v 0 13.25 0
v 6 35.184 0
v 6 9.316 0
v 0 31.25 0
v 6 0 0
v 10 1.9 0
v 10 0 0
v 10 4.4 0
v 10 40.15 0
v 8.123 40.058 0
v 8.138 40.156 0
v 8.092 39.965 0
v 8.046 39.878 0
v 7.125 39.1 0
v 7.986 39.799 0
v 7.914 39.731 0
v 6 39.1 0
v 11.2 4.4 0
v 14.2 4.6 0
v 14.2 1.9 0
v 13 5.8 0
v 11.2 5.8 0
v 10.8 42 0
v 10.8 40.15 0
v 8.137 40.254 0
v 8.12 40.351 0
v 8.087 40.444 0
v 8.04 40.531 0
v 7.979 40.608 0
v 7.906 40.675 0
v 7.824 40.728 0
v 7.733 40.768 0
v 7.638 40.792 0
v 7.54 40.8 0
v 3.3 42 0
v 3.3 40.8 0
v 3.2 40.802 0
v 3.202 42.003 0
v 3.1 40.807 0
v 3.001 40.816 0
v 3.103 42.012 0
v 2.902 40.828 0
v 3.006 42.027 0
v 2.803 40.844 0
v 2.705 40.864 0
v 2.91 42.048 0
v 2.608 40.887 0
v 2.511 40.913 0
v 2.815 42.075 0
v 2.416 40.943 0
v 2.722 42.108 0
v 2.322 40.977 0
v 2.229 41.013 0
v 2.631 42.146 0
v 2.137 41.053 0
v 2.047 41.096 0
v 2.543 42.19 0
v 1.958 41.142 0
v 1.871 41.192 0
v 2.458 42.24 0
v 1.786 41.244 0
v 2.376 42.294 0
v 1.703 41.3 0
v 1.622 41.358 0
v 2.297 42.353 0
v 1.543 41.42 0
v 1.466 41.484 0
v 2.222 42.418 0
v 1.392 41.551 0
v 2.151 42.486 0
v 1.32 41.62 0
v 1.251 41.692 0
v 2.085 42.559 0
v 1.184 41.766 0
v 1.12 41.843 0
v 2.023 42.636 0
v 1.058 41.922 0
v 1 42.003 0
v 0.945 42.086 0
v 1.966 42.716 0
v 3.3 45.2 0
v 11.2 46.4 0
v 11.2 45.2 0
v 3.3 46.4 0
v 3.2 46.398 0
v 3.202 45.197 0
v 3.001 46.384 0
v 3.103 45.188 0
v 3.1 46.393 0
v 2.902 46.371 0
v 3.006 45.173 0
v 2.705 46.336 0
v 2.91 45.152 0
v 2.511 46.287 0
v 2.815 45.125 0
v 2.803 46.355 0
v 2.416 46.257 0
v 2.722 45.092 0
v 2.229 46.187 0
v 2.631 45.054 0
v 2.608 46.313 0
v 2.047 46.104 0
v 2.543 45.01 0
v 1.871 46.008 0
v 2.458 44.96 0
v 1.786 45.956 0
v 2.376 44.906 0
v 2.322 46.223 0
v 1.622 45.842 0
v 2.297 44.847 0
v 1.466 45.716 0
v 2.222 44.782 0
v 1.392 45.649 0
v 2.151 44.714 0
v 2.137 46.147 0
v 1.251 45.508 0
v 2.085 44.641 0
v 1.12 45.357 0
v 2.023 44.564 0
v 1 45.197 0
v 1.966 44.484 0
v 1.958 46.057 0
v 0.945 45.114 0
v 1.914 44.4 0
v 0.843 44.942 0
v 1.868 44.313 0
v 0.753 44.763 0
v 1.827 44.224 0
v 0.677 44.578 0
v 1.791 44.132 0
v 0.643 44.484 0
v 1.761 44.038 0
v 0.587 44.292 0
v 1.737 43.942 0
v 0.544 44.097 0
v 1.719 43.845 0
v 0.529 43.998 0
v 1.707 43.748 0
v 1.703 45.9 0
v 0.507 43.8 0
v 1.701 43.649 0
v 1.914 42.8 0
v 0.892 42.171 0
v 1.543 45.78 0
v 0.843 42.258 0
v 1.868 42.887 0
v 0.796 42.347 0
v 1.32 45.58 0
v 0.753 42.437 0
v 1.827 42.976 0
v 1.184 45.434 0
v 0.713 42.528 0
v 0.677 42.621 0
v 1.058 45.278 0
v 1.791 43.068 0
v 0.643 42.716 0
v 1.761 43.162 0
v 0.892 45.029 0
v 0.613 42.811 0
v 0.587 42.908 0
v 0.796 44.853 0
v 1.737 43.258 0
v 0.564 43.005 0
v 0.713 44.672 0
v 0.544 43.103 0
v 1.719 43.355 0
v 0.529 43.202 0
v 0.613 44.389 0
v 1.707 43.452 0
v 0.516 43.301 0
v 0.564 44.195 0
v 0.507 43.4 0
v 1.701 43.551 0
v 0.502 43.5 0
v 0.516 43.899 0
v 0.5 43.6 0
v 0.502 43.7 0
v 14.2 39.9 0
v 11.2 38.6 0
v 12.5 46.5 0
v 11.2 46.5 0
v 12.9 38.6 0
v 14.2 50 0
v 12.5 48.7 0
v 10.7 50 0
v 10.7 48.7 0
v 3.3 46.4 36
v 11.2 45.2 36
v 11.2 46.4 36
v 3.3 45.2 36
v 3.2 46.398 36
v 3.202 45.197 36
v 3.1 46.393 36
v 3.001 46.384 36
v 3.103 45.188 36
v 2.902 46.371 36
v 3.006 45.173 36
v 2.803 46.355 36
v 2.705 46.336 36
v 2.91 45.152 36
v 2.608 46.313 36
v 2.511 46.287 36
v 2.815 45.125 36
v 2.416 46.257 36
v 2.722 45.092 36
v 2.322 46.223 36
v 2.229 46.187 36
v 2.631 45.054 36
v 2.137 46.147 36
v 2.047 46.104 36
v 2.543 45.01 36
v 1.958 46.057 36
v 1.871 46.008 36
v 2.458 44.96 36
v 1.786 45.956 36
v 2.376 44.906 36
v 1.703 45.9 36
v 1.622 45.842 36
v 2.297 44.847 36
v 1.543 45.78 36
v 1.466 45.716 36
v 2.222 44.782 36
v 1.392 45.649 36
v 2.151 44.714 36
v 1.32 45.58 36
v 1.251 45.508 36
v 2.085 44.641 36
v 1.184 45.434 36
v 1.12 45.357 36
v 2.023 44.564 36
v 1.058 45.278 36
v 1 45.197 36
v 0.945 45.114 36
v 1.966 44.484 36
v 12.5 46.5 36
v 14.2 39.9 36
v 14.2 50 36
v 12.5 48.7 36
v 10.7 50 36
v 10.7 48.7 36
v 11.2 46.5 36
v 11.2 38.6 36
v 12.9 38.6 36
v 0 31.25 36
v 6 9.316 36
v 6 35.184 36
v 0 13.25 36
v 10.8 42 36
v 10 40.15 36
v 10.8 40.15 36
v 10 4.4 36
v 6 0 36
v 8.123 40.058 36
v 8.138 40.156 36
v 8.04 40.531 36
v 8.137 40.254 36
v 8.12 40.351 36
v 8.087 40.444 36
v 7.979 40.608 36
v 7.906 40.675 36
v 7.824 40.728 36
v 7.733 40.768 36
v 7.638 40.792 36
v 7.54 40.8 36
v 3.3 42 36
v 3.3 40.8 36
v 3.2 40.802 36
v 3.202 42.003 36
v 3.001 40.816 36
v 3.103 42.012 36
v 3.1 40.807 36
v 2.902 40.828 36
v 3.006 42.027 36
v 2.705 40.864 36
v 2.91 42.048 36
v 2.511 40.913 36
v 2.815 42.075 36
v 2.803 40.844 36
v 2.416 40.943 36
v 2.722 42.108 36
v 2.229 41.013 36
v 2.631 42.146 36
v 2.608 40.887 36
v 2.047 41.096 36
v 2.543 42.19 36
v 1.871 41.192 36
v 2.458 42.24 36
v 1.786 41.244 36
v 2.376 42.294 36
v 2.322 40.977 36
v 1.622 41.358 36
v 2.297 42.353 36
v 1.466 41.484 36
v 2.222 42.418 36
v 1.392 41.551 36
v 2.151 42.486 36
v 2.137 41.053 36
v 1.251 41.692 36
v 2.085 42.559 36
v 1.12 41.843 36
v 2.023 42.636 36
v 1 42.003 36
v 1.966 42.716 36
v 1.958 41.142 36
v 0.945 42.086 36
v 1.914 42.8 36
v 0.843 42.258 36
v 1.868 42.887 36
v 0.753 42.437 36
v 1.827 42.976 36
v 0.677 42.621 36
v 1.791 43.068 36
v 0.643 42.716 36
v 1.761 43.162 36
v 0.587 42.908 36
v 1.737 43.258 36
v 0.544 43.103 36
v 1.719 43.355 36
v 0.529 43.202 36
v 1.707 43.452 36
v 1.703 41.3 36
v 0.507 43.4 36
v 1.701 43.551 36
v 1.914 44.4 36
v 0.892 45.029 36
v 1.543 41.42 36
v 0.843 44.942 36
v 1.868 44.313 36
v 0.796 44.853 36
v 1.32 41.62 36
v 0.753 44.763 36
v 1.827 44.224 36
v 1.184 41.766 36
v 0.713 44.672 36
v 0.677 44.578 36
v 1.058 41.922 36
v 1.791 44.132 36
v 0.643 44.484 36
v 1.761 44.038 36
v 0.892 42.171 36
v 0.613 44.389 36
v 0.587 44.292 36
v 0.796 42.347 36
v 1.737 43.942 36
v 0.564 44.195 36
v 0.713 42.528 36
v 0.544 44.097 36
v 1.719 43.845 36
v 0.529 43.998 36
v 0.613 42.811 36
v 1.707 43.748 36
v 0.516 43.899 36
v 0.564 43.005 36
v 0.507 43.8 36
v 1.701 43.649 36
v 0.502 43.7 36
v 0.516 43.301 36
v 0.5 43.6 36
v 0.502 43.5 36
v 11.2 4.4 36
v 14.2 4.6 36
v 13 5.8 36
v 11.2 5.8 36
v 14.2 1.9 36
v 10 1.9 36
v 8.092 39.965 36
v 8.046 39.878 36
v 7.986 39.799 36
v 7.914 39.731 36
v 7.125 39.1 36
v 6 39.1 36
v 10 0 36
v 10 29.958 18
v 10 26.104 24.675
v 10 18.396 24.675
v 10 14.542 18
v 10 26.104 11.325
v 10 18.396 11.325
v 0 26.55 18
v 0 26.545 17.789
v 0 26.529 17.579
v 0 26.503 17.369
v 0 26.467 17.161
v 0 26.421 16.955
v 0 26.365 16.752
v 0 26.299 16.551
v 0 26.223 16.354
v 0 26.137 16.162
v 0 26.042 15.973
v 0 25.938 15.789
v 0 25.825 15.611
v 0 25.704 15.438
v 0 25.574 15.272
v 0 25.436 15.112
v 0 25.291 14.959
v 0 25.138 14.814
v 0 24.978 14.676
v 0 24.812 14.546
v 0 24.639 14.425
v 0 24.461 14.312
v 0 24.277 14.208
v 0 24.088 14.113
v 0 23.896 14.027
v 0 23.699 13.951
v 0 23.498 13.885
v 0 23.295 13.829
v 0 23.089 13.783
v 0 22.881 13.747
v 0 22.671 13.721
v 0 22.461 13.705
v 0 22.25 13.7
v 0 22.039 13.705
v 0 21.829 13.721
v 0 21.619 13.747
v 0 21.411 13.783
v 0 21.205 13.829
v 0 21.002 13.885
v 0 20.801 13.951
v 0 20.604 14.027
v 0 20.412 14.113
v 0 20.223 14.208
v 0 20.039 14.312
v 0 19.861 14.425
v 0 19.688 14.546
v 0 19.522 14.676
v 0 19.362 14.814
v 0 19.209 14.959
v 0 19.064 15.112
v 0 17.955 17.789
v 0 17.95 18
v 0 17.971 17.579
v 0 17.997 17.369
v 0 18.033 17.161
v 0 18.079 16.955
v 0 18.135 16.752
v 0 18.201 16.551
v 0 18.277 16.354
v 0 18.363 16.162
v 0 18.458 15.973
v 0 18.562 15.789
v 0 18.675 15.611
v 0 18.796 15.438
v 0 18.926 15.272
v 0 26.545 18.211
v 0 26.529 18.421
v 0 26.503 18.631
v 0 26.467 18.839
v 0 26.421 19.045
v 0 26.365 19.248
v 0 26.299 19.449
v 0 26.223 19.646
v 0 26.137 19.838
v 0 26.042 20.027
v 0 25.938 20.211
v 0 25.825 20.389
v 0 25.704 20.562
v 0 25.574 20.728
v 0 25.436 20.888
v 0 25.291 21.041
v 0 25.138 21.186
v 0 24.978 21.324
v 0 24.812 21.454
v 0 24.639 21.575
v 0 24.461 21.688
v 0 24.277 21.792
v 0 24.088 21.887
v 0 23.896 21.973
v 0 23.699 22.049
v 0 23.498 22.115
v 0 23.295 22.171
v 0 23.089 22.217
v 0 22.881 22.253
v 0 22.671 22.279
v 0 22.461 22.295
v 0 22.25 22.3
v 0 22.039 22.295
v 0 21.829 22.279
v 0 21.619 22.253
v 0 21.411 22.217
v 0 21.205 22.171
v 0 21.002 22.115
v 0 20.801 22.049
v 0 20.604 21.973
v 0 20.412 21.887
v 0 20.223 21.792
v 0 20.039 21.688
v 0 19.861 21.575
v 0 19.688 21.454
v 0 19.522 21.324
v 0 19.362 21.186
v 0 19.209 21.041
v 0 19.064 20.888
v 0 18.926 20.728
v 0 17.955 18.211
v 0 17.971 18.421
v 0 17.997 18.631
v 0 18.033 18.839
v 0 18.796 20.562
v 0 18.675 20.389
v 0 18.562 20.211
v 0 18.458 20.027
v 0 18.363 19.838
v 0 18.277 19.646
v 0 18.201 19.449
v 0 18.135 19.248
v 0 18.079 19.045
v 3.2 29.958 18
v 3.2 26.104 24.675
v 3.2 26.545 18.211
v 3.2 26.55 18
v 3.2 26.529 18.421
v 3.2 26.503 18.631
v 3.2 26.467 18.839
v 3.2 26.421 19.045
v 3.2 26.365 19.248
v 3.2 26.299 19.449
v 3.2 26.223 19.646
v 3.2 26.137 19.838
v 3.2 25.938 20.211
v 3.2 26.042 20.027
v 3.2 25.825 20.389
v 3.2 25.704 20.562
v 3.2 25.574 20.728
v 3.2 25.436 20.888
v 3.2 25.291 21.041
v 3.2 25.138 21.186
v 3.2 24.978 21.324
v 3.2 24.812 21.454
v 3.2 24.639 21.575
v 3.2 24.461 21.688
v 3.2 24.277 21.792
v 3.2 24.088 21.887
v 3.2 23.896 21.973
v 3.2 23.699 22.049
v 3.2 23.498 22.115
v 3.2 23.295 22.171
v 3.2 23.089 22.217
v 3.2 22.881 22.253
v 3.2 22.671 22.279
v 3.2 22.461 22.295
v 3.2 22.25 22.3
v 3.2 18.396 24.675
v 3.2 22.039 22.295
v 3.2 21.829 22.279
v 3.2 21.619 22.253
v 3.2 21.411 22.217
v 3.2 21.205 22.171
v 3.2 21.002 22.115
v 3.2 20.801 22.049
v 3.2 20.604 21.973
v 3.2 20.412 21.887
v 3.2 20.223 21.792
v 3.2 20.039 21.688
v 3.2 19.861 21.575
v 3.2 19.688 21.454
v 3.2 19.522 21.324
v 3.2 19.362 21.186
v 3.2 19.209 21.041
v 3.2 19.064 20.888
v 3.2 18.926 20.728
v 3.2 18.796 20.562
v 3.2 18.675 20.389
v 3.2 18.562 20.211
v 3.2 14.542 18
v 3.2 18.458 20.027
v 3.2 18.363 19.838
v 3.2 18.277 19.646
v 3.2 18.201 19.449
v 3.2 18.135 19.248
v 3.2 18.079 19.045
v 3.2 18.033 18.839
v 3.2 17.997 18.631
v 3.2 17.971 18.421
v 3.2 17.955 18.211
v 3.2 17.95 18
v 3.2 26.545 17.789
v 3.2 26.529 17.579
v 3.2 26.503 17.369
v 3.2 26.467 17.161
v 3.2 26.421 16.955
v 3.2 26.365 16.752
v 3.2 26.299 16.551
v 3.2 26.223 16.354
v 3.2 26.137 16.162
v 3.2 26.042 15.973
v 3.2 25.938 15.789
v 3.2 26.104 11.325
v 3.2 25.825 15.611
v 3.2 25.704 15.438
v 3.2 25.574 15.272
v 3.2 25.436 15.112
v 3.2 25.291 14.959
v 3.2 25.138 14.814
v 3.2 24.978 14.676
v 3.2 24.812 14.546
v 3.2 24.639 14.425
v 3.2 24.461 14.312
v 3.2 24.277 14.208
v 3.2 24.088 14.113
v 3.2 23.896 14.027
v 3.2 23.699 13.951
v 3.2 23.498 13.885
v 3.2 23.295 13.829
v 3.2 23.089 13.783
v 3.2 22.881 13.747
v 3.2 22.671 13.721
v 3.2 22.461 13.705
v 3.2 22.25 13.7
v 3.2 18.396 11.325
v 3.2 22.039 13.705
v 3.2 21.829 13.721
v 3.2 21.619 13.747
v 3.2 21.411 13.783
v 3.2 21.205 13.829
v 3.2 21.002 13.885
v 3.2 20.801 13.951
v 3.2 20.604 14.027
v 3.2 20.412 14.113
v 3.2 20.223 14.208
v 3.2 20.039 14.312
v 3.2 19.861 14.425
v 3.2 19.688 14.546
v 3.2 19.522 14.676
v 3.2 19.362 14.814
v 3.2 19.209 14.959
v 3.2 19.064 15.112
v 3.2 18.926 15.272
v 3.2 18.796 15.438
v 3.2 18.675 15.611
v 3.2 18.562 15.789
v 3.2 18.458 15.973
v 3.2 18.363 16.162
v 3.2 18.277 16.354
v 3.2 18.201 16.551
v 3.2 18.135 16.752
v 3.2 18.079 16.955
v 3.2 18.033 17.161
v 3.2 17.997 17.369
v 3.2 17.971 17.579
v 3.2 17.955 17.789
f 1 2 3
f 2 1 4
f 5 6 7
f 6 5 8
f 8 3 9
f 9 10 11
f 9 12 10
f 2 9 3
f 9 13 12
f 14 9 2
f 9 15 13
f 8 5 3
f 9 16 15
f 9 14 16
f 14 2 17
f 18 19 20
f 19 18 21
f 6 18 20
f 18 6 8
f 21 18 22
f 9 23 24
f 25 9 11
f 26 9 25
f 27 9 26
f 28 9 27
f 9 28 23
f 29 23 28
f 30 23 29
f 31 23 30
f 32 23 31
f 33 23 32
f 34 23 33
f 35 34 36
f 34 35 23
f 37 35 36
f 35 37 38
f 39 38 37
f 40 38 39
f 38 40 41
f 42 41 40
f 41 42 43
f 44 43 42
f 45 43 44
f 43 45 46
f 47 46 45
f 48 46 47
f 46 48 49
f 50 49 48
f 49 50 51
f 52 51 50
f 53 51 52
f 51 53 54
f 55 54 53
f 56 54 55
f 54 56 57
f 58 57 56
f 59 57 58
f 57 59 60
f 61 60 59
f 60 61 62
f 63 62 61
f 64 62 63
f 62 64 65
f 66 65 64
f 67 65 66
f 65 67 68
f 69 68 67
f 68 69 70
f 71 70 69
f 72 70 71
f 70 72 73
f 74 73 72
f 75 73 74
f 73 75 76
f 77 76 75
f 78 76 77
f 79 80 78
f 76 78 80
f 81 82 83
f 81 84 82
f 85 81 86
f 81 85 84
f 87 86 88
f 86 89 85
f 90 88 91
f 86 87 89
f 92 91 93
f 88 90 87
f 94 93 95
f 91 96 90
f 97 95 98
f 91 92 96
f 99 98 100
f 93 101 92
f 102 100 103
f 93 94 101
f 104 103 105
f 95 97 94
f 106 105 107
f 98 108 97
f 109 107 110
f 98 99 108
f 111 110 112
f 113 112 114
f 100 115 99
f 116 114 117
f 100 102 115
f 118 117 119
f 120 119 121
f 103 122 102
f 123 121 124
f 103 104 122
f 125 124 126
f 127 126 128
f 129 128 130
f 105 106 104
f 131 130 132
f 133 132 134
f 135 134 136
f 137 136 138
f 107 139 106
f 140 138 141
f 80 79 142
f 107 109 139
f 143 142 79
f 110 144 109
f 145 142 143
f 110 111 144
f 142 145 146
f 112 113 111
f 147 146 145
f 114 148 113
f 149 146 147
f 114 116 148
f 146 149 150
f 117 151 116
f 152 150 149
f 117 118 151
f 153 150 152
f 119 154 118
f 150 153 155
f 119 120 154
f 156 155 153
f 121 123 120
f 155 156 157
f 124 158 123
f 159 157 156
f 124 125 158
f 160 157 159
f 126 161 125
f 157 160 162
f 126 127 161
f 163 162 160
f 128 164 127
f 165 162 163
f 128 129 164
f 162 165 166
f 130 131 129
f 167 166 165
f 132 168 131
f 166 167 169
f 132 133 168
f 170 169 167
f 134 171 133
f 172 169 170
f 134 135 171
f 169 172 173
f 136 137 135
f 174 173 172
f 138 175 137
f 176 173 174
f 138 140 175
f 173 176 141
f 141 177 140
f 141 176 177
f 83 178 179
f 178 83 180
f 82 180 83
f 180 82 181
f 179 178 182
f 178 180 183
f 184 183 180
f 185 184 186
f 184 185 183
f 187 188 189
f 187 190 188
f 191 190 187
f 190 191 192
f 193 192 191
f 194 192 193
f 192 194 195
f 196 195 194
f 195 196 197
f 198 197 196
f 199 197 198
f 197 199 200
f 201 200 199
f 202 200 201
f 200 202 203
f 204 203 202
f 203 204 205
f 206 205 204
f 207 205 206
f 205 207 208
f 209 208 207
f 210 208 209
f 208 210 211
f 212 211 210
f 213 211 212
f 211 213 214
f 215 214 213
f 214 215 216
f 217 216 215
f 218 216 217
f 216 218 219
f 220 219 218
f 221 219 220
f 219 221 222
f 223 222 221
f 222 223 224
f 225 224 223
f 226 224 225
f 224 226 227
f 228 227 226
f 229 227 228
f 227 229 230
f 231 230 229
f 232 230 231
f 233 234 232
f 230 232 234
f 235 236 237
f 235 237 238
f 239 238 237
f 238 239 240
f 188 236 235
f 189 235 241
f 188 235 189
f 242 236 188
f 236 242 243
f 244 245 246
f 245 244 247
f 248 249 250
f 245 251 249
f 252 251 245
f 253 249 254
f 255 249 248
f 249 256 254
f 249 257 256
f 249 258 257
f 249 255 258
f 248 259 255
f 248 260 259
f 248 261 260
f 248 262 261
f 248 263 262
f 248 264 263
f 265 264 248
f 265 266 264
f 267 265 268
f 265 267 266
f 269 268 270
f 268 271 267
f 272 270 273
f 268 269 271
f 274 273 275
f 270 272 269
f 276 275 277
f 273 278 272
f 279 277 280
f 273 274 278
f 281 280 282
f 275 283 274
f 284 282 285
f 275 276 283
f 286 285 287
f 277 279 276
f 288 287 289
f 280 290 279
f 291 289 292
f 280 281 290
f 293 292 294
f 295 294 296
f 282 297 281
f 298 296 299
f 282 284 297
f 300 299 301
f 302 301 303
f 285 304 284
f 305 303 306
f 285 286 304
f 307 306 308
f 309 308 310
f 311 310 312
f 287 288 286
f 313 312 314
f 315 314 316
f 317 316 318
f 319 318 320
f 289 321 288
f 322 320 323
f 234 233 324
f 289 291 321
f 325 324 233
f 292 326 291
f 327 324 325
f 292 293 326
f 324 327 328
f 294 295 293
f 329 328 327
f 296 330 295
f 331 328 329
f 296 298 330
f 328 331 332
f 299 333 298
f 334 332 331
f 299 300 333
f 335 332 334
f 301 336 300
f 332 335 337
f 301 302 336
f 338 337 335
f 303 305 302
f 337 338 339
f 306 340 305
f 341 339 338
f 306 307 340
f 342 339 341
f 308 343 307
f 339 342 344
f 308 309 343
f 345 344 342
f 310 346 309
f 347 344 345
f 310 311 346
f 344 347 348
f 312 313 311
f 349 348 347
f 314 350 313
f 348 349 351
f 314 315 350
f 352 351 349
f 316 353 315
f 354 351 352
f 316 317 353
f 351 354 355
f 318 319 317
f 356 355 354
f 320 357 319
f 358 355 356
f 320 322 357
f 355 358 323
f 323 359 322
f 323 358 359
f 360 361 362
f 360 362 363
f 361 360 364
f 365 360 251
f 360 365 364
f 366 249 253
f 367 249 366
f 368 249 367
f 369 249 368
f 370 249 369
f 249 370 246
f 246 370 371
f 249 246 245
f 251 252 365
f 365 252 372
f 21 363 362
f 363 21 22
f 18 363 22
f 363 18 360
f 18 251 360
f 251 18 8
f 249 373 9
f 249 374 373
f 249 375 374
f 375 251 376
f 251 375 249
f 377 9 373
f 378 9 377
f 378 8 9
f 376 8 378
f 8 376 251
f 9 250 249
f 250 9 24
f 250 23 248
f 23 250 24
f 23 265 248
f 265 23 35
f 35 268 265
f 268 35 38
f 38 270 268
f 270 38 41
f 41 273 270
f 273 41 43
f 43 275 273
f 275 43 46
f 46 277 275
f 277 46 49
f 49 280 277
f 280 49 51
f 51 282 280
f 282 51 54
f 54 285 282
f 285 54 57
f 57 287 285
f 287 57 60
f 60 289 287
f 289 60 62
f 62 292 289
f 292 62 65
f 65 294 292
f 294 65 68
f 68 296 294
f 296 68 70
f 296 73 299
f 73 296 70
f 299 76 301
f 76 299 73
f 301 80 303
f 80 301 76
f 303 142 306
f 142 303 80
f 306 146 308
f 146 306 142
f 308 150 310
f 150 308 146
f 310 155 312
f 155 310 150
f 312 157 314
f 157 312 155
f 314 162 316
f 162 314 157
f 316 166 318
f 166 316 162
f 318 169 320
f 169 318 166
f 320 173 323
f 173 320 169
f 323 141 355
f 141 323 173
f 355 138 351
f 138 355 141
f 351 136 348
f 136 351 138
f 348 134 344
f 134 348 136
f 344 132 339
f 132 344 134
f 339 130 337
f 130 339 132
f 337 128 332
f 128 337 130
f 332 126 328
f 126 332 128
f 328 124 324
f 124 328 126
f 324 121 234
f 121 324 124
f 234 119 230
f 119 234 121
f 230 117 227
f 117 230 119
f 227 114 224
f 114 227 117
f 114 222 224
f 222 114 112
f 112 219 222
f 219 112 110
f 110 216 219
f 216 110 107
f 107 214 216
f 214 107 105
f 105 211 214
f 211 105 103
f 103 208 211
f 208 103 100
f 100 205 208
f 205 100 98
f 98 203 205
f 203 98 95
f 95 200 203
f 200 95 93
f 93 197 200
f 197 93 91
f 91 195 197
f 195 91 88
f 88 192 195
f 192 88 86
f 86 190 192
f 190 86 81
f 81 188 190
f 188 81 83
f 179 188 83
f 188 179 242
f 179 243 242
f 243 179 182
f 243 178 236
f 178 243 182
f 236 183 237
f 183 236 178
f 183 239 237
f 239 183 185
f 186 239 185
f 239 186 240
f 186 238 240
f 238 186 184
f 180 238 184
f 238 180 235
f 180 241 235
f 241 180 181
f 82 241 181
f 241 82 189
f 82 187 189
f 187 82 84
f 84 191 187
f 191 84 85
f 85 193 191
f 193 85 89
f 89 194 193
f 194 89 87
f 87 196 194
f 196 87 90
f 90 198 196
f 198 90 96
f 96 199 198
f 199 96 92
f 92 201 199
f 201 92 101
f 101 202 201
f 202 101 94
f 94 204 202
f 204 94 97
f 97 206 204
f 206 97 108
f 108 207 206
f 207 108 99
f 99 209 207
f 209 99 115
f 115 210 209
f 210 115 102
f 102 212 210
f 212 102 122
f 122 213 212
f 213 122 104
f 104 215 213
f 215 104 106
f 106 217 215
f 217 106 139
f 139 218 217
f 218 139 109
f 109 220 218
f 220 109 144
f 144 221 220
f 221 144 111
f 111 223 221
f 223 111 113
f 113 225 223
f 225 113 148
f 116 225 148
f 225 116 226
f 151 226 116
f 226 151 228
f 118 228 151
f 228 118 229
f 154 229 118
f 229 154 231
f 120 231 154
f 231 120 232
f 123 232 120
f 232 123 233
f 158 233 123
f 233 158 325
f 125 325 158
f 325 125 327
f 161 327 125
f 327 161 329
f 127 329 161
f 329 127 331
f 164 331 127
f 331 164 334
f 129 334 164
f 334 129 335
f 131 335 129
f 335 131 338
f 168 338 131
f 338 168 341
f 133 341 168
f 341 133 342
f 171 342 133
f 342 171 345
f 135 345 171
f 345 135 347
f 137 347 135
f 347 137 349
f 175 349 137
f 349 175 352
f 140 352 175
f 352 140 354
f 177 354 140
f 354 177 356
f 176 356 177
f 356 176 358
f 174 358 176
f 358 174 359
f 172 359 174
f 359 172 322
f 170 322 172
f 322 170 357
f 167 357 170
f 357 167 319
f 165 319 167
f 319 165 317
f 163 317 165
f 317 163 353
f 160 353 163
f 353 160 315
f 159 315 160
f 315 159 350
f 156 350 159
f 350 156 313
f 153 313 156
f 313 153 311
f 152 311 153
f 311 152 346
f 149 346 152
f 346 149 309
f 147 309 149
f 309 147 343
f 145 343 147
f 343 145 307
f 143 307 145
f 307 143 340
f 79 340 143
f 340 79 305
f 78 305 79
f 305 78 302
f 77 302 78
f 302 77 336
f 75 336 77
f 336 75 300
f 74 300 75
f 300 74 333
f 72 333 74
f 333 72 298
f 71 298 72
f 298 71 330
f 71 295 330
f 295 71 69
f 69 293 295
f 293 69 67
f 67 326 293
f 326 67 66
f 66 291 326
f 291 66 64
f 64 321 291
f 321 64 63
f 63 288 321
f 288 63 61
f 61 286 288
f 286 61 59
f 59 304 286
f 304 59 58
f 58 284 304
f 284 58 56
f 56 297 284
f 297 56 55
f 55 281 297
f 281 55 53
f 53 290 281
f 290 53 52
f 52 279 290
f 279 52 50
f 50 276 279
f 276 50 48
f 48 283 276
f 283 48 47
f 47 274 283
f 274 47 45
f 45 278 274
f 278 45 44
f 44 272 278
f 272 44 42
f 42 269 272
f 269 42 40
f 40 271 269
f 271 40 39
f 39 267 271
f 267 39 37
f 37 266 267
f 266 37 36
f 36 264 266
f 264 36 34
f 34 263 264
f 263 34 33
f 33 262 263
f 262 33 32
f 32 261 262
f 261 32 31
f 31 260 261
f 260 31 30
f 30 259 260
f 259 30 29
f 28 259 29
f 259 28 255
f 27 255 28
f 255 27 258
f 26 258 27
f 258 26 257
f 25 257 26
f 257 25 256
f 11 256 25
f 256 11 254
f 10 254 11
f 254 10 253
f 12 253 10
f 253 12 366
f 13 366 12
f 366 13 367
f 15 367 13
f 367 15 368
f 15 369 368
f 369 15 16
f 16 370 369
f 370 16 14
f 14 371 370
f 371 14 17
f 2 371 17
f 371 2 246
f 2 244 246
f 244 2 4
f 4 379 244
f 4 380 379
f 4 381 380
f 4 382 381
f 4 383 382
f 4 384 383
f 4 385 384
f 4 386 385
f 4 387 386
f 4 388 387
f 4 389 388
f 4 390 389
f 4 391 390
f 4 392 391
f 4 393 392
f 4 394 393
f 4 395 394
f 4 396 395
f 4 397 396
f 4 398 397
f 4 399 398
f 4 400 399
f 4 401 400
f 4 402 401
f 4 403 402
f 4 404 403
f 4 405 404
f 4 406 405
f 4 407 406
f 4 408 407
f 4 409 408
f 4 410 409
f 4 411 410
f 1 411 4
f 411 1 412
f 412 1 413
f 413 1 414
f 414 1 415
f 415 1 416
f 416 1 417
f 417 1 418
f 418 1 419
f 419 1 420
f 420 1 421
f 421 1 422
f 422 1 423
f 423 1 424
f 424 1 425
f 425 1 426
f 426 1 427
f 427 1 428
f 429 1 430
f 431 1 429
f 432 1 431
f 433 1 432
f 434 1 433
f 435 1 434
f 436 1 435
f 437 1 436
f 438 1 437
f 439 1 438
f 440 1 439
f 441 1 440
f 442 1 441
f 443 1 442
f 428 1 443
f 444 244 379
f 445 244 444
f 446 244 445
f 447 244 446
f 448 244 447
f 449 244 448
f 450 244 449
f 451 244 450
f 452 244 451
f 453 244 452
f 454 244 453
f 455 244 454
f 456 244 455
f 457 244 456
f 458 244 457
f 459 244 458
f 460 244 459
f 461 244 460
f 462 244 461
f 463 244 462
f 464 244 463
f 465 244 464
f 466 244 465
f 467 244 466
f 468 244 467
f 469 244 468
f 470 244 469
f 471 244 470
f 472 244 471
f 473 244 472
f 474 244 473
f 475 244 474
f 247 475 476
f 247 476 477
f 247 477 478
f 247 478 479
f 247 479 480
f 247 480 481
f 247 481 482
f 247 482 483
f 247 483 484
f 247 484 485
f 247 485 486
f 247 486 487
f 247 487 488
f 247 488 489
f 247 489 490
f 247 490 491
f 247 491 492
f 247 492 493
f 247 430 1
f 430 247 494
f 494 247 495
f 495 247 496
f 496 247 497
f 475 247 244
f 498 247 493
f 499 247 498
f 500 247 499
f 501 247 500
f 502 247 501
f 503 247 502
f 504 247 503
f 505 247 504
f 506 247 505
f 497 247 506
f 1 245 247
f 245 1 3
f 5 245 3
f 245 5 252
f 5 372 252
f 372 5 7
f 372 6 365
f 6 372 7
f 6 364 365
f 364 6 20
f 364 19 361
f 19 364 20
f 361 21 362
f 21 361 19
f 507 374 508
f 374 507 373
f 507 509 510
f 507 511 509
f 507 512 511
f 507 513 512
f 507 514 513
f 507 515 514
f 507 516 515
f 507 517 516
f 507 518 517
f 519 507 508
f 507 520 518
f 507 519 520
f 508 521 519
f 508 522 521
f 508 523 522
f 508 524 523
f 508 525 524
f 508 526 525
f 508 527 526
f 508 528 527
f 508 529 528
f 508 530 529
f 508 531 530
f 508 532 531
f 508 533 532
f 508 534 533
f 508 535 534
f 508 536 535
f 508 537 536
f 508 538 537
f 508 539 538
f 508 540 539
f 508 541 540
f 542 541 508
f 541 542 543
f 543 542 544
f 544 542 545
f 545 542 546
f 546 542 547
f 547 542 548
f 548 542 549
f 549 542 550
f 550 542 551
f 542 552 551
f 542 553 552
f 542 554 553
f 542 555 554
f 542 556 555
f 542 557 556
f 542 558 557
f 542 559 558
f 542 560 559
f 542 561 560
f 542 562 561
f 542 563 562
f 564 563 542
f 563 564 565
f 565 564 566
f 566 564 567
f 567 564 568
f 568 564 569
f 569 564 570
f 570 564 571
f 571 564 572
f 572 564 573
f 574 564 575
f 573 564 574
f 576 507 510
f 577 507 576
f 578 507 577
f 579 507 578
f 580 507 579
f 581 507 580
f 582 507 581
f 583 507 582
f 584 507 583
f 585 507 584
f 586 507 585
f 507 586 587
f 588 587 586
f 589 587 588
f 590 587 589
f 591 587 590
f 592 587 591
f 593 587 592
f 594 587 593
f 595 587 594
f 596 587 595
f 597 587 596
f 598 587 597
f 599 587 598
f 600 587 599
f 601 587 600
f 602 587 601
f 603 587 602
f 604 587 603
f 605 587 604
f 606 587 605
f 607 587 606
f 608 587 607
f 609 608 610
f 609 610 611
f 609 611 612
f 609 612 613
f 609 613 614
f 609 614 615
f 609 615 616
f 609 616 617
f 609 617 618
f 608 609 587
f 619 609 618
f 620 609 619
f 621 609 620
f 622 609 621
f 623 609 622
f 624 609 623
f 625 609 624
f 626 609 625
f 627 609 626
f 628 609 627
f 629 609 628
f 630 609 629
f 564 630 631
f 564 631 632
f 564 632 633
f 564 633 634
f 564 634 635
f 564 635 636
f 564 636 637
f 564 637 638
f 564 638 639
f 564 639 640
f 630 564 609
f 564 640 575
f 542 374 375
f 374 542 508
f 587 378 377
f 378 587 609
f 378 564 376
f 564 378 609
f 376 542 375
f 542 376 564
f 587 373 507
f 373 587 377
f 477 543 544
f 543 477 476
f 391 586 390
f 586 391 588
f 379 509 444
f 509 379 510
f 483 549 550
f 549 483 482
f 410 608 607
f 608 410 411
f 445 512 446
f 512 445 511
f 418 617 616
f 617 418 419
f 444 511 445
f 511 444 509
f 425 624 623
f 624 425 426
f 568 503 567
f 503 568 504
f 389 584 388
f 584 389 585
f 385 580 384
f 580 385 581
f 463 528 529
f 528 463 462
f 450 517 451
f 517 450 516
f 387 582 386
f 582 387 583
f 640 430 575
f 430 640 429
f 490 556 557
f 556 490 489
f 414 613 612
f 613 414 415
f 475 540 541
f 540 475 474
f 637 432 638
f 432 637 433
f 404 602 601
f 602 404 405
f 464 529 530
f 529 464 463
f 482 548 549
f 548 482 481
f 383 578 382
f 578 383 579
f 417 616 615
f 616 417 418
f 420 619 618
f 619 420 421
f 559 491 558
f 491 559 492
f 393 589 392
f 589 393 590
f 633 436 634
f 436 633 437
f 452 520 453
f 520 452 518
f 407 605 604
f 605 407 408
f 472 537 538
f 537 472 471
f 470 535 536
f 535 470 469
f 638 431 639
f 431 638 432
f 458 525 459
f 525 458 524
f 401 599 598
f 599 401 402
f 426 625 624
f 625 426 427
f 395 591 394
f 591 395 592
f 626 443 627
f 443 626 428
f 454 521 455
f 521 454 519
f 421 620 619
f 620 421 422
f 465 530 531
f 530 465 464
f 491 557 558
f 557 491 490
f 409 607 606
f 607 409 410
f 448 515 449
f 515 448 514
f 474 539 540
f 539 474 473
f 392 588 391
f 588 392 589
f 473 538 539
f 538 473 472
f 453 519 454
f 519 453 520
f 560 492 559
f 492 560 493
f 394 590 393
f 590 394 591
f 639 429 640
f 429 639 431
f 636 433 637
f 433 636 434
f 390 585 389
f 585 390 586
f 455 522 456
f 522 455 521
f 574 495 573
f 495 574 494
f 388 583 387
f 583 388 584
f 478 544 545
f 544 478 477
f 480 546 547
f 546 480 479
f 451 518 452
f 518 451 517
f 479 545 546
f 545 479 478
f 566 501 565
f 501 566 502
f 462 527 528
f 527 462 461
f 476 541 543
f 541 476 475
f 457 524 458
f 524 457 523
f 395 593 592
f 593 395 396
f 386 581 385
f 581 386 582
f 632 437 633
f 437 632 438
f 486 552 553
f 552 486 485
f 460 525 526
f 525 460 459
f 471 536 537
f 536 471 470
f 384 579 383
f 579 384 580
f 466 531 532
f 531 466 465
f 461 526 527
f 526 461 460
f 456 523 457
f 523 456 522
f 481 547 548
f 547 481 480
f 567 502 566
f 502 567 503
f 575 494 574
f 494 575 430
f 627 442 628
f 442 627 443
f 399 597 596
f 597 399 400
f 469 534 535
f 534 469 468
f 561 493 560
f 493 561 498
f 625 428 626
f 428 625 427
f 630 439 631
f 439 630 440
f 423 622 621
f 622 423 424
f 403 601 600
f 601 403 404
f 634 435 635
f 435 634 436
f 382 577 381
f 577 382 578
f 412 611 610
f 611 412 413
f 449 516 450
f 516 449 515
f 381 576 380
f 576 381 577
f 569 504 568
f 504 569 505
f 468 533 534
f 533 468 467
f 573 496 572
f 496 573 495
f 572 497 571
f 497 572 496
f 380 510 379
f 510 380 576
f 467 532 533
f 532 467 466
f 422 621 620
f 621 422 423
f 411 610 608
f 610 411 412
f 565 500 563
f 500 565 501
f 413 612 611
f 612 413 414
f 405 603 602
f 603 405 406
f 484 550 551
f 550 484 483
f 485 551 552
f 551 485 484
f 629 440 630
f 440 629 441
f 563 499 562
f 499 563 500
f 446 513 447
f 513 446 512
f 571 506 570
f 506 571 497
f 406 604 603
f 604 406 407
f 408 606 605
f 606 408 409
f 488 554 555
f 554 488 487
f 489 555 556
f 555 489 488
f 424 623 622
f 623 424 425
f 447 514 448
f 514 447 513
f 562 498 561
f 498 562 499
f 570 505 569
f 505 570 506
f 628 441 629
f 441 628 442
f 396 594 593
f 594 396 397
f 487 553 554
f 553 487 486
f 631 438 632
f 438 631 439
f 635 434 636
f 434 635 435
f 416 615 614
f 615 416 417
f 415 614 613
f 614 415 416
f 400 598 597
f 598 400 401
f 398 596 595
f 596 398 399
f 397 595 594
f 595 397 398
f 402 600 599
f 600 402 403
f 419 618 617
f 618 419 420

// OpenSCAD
// DIN rail distribution stud holder — parametric model.
// Common-potential cable-lug connection point, e.g. for Victron Energy systems.
// The printed body mounts a metal distribution stud to a 35 mm DIN rail.
// Open in OpenSCAD, adjust the four Customizer inputs, press F6, Export > STL.
// Defaults: M8, 36 mm holder width, 35.75 mm stop spacing, 1 mm rail sheet.
// Each sheet groove includes 0.20 mm clearance. Support-to-latch gap: 0.40 mm.
// All exports are oriented for printing on their side, in millimetres.
// Wider or narrower holders change spring stiffness: check fit with a print.
// Clip mechanism inspiration (CC BY 4.0):
// Catatat / PlasticXYZ: https://www.printables.com/model/1753870-din-rail-clip-side-mount
// kc2zgu / marauder156: https://www.printables.com/model/556742-adjustable-din-rail-clip-freecad
// Bolt dimensions: https://uk.misumi-ec.com/pdf/ds/AAU1/AAU1_DIN_933_Stahl_8_8_data_sheet_en1.pdf

/* [Holder dimensions] */
// Bolt size and hex-head width across flats.
bolt = "M8"; // [M6:M6 - 10 mm head, M8:M8 - 13 mm head, M10_16:M10 - 16 mm head ISO, M10_17:M10 - 17 mm head DIN]
// M6/M8: 1 or 2 modules. M10: 1.5 or 2 modules. One module = 18 mm.
modules = 2; // [1:1 module - 18 mm, 1.5:1.5 modules - 27 mm, 2:2 modules - 36 mm]
// Added to the 35.75 mm default stop spacing. Split equally between both ends.
rail_allowance = 0; // [-0.5:0.05:0.5]
// Actual DIN rail sheet thickness. Groove clearance of 0.20 mm is added automatically.
sheet_thickness = 1; // [0.8:0.05:2]

/* [Hidden] */
$fn=128;
is_m10 = bolt=="M10_16" || bolt=="M10_17";
width = modules*18;
diameter = bolt=="M6" ? 6 : bolt=="M8" ? 8 : 10;
head_af = bolt=="M6" ? 10 : bolt=="M8" ? 13 : bolt=="M10_16" ? 16 : 17;
pocket_depth = bolt=="M6" ? 5.5 : bolt=="M8" ? 6.8 : 8;
front = is_m10 ? 11.2 : 10;
half_plateau = is_m10 ? 11 : 9;

// Side profile; curved sections are finely sampled for matching browser exports.
profile_points = [[12.93442623,4.0],[16.85,4.0],[16.85,2.875],[17.481478714,2.085651607],[17.549163987,2.014004201],[17.627665872,1.954404697],[17.714865986,1.908461393],[17.808411222,1.877414077],[17.905777249,1.862100565],[18.004336633,1.862934092],[18.101429735,1.879892168],[18.194436487,1.912517174],[18.280847088,1.959928723],[18.358329738,2.020847406],[18.424793556,2.093629326],[18.478445008,2.176310452],[18.517836303,2.266659623],[18.541904461,2.362238756],[18.55,2.460468636],[18.55,6.7],[18.551784088,6.799938535],[18.557134079,6.899749713],[18.566043155,6.99930634],[18.578499963,7.098481547],[18.594488628,7.19714895],[18.613988775,7.295182811],[18.636975555,7.392458202],[18.663419674,7.488851159],[18.693287433,7.584238845],[18.72654077,7.678499703],[18.763137309,7.771513611],[18.803030413,7.863162036],[18.846169244,7.953328188],[18.892498829,8.041897163],[18.941960127,8.128756093],[18.994490108,8.213794289],[19.05002183,8.296903383],[19.108484525,8.377977466],[19.169803693,8.456913221],[19.233901192,8.533610055],[19.300695338,8.607970231],[19.370101013,8.679898987],[19.442029769,8.749304662],[19.516389945,8.816098808],[19.593086779,8.880196307],[19.672022534,8.941515475],[19.753096617,8.99997817],[19.836205711,9.055509892],[19.921243907,9.108039873],[20.008102837,9.157501171],[20.096671812,9.203830756],[20.186837964,9.246969587],[20.278486389,9.286862691],[20.371500297,9.32345923],[20.465761155,9.356712567],[20.561148841,9.386580326],[20.657541798,9.413024445],[20.754817189,9.436011225],[20.85285105,9.455511372],[20.951518453,9.471500037],[21.05069366,9.483956845],[21.150250287,9.492865921],[21.250061465,9.498215912],[21.35,9.5],[21.449938535,9.498215912],[21.549749713,9.492865921],[21.64930634,9.483956845],[21.748481547,9.471500037],[21.84714895,9.455511372],[21.945182811,9.436011225],[22.042458202,9.413024445],[22.138851159,9.386580326],[22.234238845,9.356712567],[22.328499703,9.32345923],[22.421513611,9.286862691],[22.513162036,9.246969587],[22.603328188,9.203830756],[22.691897163,9.157501171],[22.778756093,9.108039873],[22.863794289,9.055509892],[22.946903383,8.99997817],[23.027977466,8.941515475],[23.106913221,8.880196307],[23.183610055,8.816098808],[23.257970231,8.749304662],[23.329898987,8.679898987],[23.399304662,8.607970231],[23.466098808,8.533610055],[23.530196307,8.456913221],[23.591515475,8.377977466],[23.64997817,8.296903383],[23.705509892,8.213794289],[23.758039873,8.128756093],[23.807501171,8.041897163],[23.853830756,7.953328188],[23.896969587,7.863162036],[23.936862691,7.771513611],[23.97345923,7.678499703],[24.006712567,7.584238845],[24.036580326,7.488851159],[24.063024445,7.392458202],[24.086011225,7.295182811],[24.105511372,7.19714895],[24.121500037,7.098481547],[24.133956845,6.99930634],[24.142865921,6.899749713],[24.148215912,6.799938535],[24.15,6.7],[24.15,-1.2],[24.25,-1.2],[24.25,-2.5],[26.45,-2.5],[26.45,-0.7],[27.75,-0.7],[27.75,-4.2],[17.65,-4.2],[16.35,-2.9],[16.35,-1.2],[22.95,-1.2],[22.95,6.7],[22.946965326,6.79849745],[22.937872815,6.896621265],[22.922756959,6.993999229],[22.901675098,7.090261952],[22.874707201,7.185044279],[22.841955567,7.277986666],[22.803544435,7.368736552],[22.759619511,7.456949691],[22.710347417,7.542291461],[22.65591506,7.62443813],[22.596528919,7.703078089],[22.532414268,7.77791303],[22.463814314,7.848659077],[22.39098928,7.915047867],[22.314215418,7.976827564],[22.233783957,8.033763816],[22.15,8.085640646],[22.063181369,8.132261266],[21.973657397,8.173448829],[21.881767679,8.209047095],[21.787860784,8.238921029],[21.692292933,8.262957308],[21.595426648,8.281064755],[21.497629375,8.293174682],[21.399272094,8.299241152],[21.300727906,8.299241152],[21.202370625,8.293174682],[21.104573352,8.281064755],[21.007707067,8.262957308],[20.912139216,8.238921029],[20.818232321,8.209047095],[20.726342603,8.173448829],[20.636818631,8.132261266],[20.55,8.085640646],[20.466216043,8.033763816],[20.385784582,7.976827564],[20.30901072,7.915047867],[20.236185686,7.848659077],[20.167585732,7.77791303],[20.103471081,7.703078089],[20.04408494,7.62443813],[19.989652583,7.542291461],[19.940380489,7.456949691],[19.896455565,7.368736552],[19.858044433,7.277986666],[19.825292799,7.185044279],[19.798324902,7.090261952],[19.777243041,6.993999229],[19.762127185,6.896621265],[19.753034674,6.79849745],[19.75,6.7],[19.75,-0.8],[17.9,-0.8],[17.9,0.0],[-17.85,0.0],[-17.85,-1.2],[-16.45,-1.2],[-16.45,-3.0],[-17.65,-4.2],[-20.35,-4.2],[-20.35,0.0],[-22.25,0.0],[-22.25,4.0],[-12.93442623,4.0],[-9.0,10.0],[9.0,10.0]];
// Extend the body stop with the moving jaw, retaining their 0.4 mm gap.
function sheet_z(y,z) = z-(sheet_thickness-1)*max(0,min(1,
    y>=17.9-0.000001 && y<=19.75+0.000001 ? -z/0.8 : (-z-0.8)/0.4));
function profile_point(p) = abs(p[1]-10)<0.000001
    ? [sign(p[0])*half_plateau,front]
    : [p[0]+(p[0]>14.5 ? rail_allowance/2 : p[0]<-14.5 ? -rail_allowance/2 : 0),sheet_z(p[0],p[1])];

assert(bolt=="M6" || bolt=="M8" || is_m10,"Invalid bolt size.");
assert(modules==2 || (is_m10 ? modules==1.5 : modules==1),
       "M6/M8 dovoluje 1 nebo 2 modules; M10 dovoluje 1.5 nebo 2 modules.");
assert(rail_allowance>=-0.5 && rail_allowance<=0.5,"Rail allowance must be between -0.5 and +0.5 mm.");
assert(sheet_thickness>=0.8 && sheet_thickness<=2,"Sheet thickness must be between 0.8 and 2 mm.");

module holder(){
    difference(){
        multmatrix([[0,0,1,0],[1,0,0,0],[0,1,0,0],[0,0,0,1]])
            linear_extrude(height=width,center=true,convexity=12)
                polygon([for(p=profile_points) profile_point(p)]);
        translate([0,0,-0.1]) linear_extrude(height=pocket_depth+0.1)
            polygon([for(a=[30:60:330]) [(head_af+0.35)/sqrt(3)*cos(a),(head_af+0.35)/sqrt(3)*sin(a)]]);
        translate([0,0,-0.1]) cylinder(d=diameter+0.6,h=front+0.2);
    }
}

// Orient the part on its side for printing; output units are millimetres.
translate([front,22.25+rail_allowance/2,width/2]) rotate([0,-90,0]) holder();
echo(width_mm=width,stop_spacing_mm=35.75+rail_allowance,sheet_groove_mm=sheet_thickness+0.2);
